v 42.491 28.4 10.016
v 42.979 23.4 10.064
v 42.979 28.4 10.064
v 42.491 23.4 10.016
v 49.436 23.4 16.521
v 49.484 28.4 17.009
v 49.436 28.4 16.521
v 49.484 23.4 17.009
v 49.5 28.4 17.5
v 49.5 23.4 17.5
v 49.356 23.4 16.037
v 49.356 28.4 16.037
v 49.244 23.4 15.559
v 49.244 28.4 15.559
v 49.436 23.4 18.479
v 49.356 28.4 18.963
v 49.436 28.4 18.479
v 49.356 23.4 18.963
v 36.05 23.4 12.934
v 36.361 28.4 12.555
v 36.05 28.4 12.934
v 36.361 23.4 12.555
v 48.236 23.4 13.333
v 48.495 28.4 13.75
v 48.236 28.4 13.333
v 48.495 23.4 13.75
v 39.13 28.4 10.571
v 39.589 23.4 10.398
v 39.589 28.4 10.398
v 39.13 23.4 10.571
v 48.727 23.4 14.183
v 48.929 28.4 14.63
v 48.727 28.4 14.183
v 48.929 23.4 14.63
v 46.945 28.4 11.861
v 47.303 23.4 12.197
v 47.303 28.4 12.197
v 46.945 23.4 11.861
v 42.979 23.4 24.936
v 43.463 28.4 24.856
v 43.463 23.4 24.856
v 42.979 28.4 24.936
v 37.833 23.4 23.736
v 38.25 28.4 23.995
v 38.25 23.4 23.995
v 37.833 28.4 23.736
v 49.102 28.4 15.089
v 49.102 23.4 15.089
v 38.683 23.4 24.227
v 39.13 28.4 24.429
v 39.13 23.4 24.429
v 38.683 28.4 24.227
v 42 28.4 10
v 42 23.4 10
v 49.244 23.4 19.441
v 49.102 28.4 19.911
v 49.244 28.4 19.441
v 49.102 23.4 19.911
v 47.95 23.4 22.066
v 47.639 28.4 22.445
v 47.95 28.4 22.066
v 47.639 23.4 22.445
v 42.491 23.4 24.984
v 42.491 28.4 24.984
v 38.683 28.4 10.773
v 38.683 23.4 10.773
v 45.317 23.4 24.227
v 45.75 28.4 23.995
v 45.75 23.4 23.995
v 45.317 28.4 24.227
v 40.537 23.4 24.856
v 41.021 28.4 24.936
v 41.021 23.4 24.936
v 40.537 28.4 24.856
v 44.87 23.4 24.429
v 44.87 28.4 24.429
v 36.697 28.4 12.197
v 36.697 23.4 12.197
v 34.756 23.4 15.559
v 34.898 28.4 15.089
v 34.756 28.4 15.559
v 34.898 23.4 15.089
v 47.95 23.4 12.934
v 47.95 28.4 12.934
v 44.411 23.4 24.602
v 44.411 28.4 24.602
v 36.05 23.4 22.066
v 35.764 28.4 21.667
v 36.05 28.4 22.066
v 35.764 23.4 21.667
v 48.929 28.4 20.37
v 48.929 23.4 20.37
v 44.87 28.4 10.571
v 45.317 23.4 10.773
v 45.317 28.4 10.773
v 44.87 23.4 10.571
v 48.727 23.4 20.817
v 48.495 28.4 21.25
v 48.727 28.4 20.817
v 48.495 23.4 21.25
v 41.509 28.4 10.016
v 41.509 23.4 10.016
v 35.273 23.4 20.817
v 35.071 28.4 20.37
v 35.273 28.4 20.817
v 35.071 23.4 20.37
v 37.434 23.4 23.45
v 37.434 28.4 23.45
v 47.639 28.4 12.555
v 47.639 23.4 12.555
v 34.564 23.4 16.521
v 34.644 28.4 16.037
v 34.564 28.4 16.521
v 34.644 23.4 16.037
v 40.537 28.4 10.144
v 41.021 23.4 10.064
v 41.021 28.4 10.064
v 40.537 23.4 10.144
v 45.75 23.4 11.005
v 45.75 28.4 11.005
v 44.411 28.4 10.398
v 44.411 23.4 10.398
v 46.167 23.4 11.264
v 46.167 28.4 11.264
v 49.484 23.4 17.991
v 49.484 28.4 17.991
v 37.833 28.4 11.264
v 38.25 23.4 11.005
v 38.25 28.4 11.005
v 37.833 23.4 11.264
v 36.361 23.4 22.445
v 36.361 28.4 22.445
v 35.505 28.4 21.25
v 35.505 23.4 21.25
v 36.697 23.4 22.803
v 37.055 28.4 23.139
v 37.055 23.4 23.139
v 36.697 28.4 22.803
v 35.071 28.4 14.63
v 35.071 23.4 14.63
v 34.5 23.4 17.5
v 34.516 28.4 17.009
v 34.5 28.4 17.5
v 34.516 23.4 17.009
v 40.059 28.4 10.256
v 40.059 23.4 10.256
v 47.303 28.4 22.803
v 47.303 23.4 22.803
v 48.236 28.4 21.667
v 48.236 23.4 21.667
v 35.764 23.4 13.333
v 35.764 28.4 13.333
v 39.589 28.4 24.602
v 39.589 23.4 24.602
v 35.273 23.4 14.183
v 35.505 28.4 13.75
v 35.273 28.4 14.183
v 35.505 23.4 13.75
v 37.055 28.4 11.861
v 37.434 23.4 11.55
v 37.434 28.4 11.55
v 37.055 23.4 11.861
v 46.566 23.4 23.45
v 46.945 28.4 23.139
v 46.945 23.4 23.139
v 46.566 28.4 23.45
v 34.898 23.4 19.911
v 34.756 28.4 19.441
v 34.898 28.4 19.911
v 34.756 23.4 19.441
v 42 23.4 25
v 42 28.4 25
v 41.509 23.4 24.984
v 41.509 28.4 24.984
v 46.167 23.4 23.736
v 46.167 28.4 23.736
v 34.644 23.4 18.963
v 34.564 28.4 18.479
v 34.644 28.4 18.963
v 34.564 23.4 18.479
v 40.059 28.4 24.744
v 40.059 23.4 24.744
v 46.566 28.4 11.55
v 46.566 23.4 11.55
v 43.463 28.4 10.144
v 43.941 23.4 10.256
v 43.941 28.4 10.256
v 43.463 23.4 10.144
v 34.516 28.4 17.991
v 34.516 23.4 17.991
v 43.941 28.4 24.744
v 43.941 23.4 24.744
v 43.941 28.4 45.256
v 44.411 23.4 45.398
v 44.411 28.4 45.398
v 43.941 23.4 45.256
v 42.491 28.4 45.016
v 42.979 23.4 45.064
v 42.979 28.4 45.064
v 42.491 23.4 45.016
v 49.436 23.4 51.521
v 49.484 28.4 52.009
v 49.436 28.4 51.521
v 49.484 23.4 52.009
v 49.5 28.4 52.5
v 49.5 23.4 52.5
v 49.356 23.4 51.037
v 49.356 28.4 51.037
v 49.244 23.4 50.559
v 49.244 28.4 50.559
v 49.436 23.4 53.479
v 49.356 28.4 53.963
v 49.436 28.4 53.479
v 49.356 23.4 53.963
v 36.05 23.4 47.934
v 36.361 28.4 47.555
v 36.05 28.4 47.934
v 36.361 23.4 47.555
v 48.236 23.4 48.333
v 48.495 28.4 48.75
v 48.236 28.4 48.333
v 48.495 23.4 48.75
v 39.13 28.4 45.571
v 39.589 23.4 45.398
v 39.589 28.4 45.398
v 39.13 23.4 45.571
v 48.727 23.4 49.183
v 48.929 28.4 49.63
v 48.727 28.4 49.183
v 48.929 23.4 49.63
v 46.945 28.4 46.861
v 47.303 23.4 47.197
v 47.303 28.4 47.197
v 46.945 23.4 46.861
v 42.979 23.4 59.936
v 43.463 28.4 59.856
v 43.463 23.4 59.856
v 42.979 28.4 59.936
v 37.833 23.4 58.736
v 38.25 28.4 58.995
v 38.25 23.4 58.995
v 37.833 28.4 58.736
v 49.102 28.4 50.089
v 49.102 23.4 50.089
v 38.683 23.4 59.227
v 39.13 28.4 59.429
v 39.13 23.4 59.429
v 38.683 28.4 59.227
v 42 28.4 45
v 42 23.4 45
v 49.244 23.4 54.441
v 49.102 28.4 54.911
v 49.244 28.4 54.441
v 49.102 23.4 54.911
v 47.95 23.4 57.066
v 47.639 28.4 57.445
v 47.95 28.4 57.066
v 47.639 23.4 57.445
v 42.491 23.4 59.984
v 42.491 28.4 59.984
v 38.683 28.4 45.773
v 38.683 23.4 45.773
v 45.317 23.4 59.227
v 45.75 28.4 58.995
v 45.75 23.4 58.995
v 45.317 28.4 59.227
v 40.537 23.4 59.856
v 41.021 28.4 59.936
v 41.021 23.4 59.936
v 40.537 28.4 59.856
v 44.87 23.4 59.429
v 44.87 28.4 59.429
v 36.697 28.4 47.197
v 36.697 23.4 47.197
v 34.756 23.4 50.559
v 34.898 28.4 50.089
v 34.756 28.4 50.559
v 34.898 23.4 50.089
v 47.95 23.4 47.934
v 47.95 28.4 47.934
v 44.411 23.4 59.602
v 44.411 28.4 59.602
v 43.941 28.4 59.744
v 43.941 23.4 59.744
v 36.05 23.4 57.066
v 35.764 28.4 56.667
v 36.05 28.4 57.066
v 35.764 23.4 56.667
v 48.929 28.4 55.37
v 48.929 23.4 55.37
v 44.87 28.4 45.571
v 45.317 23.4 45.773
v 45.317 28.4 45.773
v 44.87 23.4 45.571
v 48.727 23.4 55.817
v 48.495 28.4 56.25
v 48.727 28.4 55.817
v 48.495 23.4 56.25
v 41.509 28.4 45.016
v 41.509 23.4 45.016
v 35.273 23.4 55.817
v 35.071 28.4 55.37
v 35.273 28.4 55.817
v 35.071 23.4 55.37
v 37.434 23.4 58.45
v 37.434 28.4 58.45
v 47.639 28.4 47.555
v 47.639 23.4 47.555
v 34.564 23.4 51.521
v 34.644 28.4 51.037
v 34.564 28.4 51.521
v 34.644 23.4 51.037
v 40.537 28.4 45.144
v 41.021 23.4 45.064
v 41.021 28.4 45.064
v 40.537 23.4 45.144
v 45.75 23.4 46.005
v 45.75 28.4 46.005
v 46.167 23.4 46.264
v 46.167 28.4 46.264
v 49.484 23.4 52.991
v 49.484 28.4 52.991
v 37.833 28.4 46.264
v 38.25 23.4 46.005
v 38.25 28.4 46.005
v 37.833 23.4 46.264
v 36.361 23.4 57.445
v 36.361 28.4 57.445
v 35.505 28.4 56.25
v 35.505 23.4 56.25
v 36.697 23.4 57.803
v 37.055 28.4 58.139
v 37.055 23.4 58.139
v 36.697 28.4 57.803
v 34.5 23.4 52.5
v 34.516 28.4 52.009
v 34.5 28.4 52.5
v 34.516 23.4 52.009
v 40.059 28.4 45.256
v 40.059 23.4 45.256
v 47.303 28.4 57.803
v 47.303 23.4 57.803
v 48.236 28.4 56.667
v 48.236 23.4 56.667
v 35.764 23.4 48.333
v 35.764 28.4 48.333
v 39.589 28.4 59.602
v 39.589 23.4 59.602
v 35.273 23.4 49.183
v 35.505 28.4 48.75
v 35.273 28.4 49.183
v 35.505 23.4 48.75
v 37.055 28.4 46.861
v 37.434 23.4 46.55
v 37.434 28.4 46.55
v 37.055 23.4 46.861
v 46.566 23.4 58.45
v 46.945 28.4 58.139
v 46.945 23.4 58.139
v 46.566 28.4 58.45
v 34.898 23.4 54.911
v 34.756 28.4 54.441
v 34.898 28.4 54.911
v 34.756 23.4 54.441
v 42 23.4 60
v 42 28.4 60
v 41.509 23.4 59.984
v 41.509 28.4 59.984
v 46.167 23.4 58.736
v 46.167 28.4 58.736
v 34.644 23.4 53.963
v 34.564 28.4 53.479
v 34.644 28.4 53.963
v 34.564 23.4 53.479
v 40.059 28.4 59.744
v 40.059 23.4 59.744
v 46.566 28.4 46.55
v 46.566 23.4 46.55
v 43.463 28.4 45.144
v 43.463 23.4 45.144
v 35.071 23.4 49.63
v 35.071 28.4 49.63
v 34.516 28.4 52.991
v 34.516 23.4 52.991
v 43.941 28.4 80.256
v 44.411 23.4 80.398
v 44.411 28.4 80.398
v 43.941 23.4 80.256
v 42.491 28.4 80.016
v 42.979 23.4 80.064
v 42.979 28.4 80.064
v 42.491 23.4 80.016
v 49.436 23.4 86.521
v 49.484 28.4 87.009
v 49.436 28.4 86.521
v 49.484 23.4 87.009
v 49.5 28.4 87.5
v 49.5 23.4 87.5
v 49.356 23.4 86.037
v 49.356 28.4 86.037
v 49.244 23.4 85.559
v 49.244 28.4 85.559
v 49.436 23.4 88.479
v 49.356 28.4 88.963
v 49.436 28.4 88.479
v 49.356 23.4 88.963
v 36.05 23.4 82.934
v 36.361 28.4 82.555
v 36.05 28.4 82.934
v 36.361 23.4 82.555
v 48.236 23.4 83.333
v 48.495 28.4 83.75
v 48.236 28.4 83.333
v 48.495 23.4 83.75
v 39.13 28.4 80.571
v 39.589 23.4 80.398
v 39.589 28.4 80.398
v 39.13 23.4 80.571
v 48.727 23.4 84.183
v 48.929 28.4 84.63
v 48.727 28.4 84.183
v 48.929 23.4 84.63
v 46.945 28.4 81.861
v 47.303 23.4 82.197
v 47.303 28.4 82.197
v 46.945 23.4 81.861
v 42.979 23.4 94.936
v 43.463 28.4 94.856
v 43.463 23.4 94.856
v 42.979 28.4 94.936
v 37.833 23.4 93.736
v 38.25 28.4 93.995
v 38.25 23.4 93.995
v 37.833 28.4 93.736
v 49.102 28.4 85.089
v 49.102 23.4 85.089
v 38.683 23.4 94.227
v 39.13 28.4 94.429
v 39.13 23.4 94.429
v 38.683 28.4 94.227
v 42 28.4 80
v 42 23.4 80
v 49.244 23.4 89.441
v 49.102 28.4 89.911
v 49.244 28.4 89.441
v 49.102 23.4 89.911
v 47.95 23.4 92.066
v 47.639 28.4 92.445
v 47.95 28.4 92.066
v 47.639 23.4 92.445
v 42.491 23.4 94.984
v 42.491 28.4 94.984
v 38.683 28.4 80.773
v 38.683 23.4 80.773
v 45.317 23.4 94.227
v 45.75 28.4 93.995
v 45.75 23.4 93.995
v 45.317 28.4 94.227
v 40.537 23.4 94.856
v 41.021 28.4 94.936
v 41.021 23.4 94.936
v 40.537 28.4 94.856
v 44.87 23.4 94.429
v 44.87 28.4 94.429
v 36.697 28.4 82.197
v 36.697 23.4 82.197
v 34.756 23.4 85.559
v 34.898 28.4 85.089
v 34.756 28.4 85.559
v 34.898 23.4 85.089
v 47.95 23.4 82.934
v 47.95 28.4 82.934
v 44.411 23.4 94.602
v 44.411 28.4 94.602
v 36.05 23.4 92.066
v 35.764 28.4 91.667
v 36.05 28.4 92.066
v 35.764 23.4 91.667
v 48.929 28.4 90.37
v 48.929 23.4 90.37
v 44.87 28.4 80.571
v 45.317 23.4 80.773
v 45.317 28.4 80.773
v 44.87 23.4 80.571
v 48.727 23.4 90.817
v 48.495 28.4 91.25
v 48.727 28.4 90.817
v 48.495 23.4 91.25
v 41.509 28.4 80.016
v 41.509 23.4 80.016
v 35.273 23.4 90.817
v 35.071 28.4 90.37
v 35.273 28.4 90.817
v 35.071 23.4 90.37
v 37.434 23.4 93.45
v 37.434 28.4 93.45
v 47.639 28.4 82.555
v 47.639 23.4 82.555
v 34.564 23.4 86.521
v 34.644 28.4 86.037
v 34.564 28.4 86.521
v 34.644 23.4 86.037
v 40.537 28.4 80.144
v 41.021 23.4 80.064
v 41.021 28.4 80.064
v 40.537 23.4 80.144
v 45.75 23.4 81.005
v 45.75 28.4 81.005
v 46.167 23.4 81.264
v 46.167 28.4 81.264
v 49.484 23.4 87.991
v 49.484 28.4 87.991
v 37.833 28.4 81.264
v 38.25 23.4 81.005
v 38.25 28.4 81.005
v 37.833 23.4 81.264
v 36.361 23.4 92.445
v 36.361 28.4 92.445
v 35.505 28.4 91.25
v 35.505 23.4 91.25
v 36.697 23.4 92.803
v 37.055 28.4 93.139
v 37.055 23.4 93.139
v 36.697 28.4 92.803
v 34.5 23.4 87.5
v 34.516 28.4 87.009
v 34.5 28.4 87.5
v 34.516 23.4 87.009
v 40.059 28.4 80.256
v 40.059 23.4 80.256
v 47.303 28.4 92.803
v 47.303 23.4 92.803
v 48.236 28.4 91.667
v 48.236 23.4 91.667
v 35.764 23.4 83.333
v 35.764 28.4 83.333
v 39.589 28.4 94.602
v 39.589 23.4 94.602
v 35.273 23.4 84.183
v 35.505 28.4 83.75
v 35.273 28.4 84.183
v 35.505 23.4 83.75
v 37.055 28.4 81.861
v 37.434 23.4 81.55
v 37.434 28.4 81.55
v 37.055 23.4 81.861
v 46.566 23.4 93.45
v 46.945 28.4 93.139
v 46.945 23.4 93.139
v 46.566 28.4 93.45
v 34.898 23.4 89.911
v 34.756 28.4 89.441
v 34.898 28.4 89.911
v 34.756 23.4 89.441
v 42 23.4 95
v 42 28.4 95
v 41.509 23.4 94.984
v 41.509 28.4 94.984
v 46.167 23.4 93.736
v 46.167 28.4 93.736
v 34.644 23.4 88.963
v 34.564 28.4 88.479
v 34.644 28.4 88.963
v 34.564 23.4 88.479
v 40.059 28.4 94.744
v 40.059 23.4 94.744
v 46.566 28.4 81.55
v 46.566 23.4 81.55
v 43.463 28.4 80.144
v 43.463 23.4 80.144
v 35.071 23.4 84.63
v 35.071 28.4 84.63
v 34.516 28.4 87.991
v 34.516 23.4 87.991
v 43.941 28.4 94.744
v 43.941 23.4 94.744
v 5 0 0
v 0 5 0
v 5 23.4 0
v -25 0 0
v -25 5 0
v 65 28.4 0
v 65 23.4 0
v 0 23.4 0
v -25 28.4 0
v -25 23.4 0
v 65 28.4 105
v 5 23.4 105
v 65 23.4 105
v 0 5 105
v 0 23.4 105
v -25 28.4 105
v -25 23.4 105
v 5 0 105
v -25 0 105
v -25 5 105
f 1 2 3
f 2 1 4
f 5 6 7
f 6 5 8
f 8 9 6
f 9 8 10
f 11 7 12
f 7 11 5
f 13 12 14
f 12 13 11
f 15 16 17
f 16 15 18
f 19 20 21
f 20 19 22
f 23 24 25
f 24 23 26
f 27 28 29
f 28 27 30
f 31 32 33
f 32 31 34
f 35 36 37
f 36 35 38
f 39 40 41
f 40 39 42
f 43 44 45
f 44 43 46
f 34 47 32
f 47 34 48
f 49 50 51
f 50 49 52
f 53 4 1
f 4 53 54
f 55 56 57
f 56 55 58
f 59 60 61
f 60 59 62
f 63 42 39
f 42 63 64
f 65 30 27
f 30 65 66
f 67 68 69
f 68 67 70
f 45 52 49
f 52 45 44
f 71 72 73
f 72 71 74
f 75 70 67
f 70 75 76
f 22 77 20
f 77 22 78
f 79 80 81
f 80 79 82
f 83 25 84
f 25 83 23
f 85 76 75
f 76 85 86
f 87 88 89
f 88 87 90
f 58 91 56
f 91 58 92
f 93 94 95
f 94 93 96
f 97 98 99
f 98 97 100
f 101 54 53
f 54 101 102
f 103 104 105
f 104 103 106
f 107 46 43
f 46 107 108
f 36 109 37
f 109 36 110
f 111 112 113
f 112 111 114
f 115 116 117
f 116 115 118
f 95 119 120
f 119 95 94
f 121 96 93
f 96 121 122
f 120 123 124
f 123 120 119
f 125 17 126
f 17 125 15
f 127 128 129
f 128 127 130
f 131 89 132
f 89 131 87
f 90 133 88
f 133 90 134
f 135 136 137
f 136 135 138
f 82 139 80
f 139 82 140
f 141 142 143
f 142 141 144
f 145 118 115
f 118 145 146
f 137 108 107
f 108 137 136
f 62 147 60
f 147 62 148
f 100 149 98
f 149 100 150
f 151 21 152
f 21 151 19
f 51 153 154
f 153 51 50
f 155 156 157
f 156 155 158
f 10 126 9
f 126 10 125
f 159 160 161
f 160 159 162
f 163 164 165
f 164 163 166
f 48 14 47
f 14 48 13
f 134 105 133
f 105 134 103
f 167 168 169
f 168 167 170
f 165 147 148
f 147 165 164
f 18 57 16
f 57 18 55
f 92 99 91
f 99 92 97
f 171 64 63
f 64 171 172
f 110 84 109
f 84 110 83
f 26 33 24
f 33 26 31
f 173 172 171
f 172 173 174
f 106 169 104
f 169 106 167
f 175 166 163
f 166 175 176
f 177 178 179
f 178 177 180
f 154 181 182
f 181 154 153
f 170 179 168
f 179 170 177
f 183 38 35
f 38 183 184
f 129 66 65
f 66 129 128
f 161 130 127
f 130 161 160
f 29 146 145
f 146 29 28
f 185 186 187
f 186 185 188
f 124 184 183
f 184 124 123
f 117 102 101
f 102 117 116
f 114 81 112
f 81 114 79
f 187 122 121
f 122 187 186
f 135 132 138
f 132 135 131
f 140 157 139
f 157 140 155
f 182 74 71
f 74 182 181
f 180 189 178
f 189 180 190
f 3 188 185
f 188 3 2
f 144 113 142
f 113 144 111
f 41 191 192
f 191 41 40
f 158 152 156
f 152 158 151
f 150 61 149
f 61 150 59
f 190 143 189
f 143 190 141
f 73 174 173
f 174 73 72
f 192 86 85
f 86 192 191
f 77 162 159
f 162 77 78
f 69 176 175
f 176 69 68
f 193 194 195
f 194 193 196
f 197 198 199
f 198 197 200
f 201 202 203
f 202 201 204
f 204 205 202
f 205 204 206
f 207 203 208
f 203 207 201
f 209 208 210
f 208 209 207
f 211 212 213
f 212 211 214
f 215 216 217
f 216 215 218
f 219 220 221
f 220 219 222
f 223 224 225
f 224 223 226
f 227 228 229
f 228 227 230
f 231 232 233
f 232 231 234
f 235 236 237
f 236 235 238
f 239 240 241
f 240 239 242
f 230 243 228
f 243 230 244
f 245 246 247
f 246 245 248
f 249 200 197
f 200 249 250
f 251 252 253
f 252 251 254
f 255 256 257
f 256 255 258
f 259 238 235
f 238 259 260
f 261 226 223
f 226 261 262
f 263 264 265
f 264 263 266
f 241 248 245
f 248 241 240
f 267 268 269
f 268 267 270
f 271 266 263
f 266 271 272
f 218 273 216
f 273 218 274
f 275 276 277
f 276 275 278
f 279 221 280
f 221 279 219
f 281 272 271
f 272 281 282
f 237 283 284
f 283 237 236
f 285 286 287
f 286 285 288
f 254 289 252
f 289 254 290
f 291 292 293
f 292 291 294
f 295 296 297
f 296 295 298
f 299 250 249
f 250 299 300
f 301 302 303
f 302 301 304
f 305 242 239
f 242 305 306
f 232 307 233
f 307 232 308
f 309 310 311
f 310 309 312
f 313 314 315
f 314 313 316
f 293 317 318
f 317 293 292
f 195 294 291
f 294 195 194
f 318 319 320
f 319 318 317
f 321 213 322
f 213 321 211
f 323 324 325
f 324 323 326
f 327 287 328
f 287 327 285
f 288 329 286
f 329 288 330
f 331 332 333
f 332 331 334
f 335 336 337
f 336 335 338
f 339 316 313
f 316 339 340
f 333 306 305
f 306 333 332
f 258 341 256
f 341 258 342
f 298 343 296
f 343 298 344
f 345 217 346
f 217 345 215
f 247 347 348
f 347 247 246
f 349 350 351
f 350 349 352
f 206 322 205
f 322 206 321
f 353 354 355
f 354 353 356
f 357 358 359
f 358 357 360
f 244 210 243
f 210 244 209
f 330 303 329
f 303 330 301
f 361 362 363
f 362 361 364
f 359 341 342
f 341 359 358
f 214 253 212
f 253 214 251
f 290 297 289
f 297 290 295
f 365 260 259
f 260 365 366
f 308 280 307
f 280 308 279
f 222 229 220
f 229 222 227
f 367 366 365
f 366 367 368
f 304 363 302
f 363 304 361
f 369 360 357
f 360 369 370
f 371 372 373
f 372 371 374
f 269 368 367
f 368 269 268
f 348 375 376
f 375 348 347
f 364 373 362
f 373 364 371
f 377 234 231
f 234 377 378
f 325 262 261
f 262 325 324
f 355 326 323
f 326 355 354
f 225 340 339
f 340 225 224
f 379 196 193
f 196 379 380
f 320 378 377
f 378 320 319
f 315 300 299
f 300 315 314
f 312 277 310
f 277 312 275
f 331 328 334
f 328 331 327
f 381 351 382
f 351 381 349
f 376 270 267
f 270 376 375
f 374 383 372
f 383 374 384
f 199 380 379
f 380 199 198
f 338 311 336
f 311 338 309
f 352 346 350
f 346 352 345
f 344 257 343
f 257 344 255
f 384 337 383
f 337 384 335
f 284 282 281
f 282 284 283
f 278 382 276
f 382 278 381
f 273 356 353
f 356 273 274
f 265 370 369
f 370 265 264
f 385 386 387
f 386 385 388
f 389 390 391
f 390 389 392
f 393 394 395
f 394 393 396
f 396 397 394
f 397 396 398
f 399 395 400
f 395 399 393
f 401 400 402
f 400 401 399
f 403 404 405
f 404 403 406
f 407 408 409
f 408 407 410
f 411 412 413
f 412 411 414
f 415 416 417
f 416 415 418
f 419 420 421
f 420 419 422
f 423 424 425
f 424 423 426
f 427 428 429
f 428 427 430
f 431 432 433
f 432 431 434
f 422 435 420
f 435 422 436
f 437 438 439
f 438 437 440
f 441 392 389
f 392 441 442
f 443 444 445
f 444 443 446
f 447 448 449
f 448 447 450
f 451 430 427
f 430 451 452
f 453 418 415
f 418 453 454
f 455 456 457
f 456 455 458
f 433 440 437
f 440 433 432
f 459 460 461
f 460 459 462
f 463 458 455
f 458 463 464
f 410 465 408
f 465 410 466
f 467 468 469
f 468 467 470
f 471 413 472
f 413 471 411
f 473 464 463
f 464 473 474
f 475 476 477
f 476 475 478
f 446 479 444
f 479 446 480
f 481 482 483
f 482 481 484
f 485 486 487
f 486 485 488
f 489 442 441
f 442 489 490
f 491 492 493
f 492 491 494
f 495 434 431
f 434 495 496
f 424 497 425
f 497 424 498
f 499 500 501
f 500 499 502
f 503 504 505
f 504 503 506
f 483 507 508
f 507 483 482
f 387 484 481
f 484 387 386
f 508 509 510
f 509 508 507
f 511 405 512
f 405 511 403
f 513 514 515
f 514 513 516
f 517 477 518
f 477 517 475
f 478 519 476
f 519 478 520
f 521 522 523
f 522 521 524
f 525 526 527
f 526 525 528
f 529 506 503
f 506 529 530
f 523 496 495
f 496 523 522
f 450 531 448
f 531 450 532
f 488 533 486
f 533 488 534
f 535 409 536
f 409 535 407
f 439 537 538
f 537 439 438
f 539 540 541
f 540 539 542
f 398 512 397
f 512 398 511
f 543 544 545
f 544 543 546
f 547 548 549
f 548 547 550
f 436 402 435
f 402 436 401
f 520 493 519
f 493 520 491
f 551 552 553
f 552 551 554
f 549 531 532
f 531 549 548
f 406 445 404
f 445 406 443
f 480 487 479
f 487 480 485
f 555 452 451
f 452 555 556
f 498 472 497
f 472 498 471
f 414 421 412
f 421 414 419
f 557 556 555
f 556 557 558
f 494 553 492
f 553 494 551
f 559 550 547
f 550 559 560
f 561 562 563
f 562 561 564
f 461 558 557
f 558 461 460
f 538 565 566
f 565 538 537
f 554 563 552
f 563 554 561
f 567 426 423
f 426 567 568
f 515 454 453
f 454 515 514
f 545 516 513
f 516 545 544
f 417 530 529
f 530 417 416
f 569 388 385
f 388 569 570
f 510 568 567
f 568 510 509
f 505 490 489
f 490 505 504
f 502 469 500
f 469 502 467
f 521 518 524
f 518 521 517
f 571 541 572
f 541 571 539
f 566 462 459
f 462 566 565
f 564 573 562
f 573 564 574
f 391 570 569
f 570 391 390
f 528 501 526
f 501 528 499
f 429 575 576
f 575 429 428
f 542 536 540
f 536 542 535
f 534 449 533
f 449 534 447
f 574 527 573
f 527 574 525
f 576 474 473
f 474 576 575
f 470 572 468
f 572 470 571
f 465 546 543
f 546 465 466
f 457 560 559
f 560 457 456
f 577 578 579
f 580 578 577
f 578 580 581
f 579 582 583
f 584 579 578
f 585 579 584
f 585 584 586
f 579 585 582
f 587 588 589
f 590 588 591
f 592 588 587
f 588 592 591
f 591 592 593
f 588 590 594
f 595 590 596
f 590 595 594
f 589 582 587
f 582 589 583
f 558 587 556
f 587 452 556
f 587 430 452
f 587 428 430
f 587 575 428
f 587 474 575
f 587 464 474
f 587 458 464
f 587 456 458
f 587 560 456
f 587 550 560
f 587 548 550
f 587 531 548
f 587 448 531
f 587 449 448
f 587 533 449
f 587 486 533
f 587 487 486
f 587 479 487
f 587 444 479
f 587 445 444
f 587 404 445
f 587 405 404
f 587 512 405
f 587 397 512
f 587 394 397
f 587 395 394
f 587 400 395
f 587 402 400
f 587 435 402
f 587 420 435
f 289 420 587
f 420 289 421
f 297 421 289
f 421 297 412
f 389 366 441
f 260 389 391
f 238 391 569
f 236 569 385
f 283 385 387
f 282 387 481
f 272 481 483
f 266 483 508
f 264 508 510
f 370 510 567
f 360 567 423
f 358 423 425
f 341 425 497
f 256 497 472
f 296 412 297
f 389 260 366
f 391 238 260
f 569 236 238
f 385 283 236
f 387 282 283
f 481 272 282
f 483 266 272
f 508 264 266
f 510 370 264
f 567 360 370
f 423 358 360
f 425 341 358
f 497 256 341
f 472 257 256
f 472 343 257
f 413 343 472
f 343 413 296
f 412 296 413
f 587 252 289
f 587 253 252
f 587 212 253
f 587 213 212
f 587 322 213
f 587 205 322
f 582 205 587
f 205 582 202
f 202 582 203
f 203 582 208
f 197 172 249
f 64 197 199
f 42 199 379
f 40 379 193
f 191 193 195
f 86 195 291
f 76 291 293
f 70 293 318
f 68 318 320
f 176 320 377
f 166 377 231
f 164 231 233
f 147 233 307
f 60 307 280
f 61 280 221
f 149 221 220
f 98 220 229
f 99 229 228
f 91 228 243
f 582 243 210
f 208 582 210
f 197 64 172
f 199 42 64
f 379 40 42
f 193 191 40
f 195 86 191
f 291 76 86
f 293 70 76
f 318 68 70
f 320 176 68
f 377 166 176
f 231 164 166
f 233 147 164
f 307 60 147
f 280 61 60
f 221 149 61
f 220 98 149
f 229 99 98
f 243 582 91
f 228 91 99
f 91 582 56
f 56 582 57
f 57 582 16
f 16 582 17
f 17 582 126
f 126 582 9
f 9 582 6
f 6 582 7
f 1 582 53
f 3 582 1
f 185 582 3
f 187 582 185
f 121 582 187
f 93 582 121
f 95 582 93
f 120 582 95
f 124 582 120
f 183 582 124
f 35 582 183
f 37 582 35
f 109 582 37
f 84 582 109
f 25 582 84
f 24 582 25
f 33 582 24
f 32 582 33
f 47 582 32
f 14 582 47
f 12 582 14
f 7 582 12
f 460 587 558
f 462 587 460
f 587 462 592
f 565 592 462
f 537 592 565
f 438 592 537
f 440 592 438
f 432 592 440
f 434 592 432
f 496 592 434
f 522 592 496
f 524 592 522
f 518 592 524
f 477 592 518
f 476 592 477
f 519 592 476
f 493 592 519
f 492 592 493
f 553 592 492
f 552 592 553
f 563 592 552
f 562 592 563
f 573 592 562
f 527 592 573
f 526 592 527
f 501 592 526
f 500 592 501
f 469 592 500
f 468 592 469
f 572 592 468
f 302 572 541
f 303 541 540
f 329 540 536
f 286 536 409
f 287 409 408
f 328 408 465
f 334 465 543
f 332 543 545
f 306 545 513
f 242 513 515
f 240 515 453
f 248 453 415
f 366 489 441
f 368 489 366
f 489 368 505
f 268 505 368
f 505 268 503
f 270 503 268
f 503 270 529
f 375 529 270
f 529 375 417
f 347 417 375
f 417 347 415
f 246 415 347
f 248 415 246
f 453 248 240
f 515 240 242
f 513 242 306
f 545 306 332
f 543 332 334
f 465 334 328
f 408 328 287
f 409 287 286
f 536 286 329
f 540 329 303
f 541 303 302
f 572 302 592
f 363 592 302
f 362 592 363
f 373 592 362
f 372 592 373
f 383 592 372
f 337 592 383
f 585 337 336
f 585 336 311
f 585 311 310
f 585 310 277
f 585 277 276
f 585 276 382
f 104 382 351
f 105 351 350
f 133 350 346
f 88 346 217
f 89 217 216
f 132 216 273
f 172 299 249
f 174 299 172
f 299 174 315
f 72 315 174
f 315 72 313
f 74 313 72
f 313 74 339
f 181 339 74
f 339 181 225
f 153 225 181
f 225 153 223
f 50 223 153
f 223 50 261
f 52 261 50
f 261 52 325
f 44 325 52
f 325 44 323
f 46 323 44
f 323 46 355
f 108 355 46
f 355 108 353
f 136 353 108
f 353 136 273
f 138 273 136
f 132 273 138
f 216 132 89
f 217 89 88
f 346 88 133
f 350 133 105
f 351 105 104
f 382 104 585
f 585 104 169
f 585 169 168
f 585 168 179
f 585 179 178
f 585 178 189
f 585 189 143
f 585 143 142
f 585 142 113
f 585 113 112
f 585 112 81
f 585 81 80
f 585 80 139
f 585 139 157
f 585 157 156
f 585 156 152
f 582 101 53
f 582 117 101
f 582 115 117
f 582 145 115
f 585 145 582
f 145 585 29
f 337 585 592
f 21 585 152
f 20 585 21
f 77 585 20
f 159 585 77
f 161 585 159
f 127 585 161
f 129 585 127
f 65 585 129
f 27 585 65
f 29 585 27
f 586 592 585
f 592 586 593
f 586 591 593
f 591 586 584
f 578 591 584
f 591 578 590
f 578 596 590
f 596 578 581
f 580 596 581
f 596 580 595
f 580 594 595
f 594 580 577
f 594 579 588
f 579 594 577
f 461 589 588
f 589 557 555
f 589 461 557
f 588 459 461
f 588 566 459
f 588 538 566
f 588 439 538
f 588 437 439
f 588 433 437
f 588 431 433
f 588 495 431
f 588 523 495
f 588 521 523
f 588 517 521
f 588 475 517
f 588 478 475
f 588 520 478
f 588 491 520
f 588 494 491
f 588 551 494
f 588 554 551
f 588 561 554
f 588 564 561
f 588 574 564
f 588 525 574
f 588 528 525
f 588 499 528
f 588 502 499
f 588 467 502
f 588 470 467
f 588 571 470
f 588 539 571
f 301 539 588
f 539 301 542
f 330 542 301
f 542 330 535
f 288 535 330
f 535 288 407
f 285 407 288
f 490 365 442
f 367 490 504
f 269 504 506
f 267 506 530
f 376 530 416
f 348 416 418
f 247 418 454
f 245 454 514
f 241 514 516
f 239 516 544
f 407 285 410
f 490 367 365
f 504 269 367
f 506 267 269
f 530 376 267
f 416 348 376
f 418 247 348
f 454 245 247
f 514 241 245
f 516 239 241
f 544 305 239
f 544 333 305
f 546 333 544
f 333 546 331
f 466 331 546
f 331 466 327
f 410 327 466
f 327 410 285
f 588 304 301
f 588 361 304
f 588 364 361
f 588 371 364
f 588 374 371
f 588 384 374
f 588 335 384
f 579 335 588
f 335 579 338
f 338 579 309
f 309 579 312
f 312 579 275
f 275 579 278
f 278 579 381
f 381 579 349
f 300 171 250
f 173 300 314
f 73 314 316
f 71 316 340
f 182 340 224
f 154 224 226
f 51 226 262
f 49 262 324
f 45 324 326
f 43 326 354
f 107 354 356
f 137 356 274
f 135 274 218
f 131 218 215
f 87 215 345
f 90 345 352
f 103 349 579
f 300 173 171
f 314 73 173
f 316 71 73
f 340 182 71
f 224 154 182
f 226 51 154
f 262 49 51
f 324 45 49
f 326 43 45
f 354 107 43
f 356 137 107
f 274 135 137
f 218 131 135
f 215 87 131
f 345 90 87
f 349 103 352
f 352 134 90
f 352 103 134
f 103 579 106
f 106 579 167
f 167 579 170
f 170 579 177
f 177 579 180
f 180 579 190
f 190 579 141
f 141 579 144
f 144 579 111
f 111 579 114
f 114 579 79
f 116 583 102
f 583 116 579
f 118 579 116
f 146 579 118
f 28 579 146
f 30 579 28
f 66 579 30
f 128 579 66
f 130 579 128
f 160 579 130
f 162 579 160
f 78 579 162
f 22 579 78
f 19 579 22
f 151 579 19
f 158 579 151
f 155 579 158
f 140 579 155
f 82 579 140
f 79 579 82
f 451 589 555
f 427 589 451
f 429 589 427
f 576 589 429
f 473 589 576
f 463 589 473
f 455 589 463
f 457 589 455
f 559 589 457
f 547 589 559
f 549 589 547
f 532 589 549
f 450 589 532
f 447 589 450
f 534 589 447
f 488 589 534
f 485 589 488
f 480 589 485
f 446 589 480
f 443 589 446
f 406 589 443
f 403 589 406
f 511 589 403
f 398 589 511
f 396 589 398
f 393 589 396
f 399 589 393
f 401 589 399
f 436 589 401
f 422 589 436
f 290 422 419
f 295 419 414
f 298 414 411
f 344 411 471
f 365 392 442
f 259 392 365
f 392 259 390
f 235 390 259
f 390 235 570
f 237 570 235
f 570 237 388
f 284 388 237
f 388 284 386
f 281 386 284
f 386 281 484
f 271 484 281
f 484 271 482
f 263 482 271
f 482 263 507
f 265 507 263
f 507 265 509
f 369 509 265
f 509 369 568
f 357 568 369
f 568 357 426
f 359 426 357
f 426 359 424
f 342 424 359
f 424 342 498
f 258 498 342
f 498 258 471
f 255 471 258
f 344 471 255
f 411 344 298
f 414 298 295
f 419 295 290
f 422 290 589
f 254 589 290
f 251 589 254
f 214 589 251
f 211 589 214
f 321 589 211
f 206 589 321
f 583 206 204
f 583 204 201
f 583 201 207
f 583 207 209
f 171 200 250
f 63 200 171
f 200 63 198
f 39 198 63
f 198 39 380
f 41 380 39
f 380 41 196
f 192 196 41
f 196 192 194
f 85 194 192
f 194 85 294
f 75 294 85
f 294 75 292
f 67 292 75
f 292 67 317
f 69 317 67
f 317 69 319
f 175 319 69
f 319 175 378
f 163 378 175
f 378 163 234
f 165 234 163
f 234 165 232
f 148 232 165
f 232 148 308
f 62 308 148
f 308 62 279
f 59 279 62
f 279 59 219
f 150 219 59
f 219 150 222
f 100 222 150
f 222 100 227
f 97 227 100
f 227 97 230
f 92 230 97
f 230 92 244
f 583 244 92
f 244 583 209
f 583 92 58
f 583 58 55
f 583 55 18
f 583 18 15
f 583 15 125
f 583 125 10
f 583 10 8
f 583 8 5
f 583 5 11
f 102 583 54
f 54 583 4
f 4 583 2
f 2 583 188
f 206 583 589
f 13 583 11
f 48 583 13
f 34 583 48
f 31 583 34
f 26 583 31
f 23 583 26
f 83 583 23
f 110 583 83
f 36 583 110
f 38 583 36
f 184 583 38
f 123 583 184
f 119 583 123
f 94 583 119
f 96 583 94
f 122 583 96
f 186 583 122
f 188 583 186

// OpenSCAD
// KNOWN-WRONG PART (must fail): the pipette holes are 15 mm instead of 20
// Holder for 3 single-channel pipettes that clamps onto the front edge of an 18 mm shelf
// Category: quick fixes. A C-shaped clamp (spine, bottom jaw, top jaw) whose top jaw continues
// forward as an arm with three 20 mm holes; each pipette drops in and hangs by its handle.
// Modelled in print orientation: lying on its side, the profile in XY extruded along Z
// (in use +Y is up and +X points away from the shelf), so the jaws print as plain walls.
// Print: PETG (springier than PLA), 0.2 mm layers, 4 perimeters.
// SPDX-License-Identifier: CERN-OHL-P-2.0

/* [Holder] */
width = 105;              // extrusion length (along the shelf edge)
spine = [0, 5];           // x from, x to
jaw_back = -25;           // both jaws reach back to x = -25
jaw_t = 5;
gap = 18.4;               // 18 mm shelf + clearance
arm_front = 65;           // the top jaw continues forward to x = 65
hole_d = 15;
hole_x = 42;
hole_z = [17.5, 52.5, 87.5];

/* [Hidden] */
eps = 0.01;
H = jaw_t + gap + jaw_t;  // 28.4

difference() {
    linear_extrude(width) union() {
        translate([spine[0], 0]) square([spine[1] - spine[0], H]);
        translate([jaw_back, 0]) square([spine[1] - jaw_back, jaw_t]);
        translate([jaw_back, H - jaw_t]) square([arm_front - jaw_back, jaw_t]);
    }
    for (z = hole_z)
        translate([hole_x, H - jaw_t - 1, z]) rotate([-90, 0, 0]) cylinder(d = hole_d, h = jaw_t + 2, $fn = 96);
}
